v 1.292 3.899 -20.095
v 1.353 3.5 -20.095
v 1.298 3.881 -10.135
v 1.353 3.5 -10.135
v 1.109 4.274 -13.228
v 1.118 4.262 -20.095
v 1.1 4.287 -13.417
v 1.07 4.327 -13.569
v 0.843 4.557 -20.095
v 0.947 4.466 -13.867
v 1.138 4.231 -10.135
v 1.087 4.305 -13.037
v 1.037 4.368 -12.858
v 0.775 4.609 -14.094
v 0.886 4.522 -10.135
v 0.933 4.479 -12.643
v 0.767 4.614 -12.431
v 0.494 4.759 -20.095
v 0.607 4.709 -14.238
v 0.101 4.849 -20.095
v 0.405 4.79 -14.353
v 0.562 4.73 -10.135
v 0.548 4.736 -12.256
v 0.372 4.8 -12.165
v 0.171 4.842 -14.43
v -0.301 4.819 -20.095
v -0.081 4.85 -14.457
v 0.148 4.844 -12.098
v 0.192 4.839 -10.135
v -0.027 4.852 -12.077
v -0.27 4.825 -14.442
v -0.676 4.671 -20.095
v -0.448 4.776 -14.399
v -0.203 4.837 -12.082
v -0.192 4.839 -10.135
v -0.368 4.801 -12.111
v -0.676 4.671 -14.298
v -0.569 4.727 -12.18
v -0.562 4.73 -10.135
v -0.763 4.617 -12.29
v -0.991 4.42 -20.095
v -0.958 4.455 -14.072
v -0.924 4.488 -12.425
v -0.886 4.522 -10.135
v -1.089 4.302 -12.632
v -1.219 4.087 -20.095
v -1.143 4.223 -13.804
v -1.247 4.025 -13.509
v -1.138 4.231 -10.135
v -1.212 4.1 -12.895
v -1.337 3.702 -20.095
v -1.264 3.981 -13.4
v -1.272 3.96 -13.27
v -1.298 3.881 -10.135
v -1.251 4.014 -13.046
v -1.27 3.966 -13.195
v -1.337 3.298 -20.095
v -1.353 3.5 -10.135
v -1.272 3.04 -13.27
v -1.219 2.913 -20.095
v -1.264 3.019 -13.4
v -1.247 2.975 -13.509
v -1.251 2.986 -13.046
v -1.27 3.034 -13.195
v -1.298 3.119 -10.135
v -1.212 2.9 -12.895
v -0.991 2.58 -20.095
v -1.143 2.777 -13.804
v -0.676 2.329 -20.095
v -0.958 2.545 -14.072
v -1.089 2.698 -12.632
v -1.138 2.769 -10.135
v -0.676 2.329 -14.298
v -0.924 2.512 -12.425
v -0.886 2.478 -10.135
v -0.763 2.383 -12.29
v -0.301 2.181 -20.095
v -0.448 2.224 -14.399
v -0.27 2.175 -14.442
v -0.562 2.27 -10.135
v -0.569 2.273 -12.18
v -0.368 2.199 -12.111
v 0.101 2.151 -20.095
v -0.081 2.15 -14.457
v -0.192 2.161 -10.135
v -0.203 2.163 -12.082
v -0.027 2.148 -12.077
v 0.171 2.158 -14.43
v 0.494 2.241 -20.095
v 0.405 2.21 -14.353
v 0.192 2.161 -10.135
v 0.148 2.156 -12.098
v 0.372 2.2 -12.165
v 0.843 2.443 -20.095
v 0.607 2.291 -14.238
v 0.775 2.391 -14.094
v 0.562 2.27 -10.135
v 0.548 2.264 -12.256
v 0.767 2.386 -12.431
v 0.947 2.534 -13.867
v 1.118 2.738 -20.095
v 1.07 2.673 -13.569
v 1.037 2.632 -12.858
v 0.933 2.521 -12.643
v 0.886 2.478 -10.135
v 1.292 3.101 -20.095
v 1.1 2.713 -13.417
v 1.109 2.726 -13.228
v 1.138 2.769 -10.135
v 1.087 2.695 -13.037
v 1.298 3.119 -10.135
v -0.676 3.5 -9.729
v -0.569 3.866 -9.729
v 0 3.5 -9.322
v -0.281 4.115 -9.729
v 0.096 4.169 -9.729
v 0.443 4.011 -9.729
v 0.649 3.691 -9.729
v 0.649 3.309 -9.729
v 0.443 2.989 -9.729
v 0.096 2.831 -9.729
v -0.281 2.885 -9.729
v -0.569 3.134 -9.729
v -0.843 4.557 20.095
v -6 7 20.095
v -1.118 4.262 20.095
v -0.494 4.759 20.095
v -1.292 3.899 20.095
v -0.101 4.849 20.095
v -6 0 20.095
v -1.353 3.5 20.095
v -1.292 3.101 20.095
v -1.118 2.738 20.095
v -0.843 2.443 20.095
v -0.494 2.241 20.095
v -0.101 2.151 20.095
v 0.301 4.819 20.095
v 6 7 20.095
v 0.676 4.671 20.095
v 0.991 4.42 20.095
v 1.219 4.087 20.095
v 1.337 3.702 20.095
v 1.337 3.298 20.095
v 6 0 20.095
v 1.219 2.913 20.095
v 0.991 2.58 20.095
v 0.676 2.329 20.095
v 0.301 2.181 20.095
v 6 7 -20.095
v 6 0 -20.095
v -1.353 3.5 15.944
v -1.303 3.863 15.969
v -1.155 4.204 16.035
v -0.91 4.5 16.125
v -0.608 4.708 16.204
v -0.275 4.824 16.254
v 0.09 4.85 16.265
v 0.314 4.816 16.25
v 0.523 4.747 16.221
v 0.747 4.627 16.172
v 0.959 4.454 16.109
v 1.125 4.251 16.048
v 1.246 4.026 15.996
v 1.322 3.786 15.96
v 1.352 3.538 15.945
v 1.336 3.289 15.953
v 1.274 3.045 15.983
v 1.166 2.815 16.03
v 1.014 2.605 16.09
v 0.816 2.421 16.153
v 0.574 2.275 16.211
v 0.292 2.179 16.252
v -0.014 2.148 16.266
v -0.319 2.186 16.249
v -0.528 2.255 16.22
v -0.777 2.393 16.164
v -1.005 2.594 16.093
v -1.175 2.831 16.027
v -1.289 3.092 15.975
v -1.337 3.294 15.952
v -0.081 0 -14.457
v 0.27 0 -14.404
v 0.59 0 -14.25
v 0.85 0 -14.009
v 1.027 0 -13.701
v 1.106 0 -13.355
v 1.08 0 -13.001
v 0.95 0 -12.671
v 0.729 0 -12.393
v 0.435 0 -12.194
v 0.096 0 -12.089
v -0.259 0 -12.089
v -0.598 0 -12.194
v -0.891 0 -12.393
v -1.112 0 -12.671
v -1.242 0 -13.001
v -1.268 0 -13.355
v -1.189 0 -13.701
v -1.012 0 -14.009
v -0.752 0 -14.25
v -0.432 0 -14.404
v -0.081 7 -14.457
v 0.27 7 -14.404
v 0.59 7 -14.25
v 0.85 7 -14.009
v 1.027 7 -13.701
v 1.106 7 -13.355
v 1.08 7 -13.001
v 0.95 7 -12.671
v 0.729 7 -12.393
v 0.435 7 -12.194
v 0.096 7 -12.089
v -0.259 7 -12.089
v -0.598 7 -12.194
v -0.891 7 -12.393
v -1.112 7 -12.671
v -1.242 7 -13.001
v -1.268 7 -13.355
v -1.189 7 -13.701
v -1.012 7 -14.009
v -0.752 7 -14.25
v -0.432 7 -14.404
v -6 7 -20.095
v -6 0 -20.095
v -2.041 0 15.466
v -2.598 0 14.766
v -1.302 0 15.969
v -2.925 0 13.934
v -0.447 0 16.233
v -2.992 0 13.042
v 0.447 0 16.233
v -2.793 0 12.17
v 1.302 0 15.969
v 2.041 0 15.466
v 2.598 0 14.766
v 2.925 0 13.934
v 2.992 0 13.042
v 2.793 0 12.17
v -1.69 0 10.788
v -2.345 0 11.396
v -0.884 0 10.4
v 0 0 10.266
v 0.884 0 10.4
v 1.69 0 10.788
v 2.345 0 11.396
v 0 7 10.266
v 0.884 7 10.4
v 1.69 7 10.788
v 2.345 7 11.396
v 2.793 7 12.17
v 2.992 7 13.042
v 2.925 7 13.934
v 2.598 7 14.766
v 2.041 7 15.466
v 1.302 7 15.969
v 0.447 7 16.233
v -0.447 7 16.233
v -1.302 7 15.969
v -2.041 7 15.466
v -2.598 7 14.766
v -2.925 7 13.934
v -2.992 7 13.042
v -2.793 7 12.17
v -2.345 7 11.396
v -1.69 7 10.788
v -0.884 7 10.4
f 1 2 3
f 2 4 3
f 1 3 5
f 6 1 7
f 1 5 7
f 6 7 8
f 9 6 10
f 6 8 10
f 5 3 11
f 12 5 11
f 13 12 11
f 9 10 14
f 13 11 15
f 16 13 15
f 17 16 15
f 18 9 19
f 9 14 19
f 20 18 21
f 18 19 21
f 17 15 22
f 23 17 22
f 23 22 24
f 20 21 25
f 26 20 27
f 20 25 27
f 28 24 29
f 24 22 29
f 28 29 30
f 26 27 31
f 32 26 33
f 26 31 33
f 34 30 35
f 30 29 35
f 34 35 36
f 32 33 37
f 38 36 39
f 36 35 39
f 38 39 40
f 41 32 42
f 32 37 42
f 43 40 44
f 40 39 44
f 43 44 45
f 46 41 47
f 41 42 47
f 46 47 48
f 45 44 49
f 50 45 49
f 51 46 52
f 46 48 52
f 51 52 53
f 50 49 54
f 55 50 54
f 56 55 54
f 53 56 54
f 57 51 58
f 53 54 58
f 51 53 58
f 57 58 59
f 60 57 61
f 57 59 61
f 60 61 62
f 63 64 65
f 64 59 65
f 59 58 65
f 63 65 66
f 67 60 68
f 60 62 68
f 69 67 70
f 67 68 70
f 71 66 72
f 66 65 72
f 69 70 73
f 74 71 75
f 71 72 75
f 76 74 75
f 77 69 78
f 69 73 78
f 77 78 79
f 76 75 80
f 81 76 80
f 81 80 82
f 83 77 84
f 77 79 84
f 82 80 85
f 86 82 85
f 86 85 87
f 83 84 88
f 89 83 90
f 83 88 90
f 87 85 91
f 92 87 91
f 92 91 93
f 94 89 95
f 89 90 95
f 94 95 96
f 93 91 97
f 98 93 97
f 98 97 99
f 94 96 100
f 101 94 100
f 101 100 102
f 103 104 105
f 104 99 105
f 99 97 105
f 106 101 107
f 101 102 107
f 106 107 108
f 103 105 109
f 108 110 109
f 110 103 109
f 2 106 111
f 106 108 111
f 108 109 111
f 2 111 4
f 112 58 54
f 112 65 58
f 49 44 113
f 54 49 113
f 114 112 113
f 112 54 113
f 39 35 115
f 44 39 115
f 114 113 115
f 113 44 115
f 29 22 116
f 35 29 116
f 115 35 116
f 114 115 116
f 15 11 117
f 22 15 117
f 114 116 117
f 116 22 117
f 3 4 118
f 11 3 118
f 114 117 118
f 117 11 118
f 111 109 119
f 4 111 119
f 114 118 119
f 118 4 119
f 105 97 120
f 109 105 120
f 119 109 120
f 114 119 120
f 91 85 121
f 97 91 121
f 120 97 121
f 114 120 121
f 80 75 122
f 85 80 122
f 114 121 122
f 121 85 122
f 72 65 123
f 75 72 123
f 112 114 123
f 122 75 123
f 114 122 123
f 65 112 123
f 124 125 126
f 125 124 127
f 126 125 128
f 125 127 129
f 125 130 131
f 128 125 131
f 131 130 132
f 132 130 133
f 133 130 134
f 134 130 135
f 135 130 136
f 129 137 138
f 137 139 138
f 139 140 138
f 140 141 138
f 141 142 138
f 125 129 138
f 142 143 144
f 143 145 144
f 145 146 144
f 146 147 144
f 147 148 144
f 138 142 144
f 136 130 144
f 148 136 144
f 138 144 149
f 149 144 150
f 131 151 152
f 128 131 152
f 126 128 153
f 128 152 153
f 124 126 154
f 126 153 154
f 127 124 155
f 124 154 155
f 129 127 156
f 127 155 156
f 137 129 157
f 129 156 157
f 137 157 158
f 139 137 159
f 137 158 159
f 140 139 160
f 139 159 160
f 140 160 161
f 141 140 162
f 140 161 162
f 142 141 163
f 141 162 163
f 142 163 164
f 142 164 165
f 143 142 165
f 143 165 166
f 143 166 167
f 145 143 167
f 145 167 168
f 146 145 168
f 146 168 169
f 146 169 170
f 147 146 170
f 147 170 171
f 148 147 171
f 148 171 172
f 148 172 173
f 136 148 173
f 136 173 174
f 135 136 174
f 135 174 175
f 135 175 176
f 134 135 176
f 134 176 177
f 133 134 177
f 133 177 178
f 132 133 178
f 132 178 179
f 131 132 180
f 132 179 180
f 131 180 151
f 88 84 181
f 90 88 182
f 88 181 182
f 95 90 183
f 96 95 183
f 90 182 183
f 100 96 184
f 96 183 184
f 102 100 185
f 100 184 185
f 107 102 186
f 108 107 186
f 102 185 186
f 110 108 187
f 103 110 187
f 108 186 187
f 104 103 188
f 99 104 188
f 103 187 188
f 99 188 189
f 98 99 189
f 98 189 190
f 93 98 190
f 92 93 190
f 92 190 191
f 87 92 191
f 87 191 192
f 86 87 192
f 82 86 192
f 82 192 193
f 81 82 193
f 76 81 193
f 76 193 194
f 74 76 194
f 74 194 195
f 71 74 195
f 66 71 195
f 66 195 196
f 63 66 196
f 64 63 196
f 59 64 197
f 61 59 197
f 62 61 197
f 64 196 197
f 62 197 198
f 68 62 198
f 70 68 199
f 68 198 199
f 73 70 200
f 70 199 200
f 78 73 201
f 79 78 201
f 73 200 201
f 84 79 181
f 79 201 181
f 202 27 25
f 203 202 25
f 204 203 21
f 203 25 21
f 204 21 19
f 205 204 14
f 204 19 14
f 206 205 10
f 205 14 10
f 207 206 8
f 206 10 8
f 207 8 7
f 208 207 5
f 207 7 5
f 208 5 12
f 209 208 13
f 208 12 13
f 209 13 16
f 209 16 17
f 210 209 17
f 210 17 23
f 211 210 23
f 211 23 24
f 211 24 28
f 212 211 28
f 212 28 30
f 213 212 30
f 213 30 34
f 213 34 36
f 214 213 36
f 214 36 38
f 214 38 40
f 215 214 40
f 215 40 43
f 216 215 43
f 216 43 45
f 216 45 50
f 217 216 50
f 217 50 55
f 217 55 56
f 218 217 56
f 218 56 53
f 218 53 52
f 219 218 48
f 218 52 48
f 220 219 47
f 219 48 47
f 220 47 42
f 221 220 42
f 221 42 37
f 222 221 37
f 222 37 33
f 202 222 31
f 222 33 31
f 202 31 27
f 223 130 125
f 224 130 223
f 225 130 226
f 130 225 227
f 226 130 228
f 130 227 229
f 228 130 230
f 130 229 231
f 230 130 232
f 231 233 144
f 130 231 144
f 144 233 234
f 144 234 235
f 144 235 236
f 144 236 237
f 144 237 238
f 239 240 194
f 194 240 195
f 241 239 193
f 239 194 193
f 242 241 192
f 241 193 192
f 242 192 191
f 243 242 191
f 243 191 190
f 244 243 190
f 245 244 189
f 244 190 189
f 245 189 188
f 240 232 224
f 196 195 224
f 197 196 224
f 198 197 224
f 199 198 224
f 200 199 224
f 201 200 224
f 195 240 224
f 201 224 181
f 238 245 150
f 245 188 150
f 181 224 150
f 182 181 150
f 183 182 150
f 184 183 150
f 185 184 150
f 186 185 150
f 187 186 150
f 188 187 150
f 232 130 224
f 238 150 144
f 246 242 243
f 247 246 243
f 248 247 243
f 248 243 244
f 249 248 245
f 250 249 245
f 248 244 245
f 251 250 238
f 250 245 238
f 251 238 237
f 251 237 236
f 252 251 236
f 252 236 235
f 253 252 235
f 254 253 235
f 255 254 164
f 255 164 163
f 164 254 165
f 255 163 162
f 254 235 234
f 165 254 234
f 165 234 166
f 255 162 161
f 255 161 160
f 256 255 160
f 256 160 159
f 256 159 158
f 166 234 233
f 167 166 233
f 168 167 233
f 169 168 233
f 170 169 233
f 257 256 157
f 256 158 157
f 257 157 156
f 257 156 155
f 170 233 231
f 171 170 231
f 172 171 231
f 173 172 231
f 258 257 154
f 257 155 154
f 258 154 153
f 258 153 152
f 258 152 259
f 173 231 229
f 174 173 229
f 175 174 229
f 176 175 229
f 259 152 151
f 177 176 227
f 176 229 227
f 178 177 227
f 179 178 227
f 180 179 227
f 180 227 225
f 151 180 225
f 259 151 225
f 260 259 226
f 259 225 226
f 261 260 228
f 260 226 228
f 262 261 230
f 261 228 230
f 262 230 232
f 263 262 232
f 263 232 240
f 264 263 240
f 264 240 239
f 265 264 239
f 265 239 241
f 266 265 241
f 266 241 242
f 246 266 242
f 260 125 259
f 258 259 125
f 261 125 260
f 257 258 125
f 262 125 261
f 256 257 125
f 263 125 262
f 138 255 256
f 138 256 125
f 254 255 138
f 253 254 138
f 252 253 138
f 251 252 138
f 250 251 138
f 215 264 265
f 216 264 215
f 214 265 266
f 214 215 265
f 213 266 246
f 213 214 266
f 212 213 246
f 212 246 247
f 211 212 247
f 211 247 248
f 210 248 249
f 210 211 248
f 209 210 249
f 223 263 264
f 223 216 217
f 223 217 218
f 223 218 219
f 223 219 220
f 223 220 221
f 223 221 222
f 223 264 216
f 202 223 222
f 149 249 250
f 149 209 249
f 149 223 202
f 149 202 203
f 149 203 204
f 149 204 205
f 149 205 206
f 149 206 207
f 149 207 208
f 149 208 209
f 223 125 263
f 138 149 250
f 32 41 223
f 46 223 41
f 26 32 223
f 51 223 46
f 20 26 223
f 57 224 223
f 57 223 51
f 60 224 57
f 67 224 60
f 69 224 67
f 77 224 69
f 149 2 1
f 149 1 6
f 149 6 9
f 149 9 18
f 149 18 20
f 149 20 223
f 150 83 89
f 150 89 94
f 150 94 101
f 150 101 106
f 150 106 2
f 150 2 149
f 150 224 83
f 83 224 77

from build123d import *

# Parameters (mm, degrees)
SKETCH9_W                           = 12
SKETCH9_H                           = 40.19
EXTRUDE3_DEPTH                      = 7
F_3_32_0_09375_DIAMETER_HOLE1_D     = 2.38125
F_3_32_0_09375_DIAMETER_HOLE1_DEPTH = 10
F_3_32_0_09375_DIAMETER_HOLE1_TIP   = 0.715399675
F_6_0_6_DIAMETER_HOLE1_D            = 6
F_6_0_6_DIAMETER_HOLE1_DEPTH        = 10
F_6_0_6_DIAMETER_HOLE1_TIP          = 1.802581857
F_6_32_TAPPED_HOLE2_D               = 2.7051
F_6_32_TAPPED_HOLE2_DEPTH           = 7.9624
F_6_32_TAPPED_HOLE2_TIP             = 0.81269403
F_6_32_TAPPED_HOLE1_D               = 2.7051
F_6_32_TAPPED_HOLE1_DEPTH           = 9.96
F_6_32_TAPPED_HOLE1_TIP             = 0.81269403


with BuildPart() as part:
    # Sketch9 → Extrude3 (new body)
    with BuildSketch(Plane(origin=(0, 0, 0), x_dir=(1, 0, 0), z_dir=(0, 1, 0))):
        Rectangle(SKETCH9_W, SKETCH9_H)
    extrude(amount=EXTRUDE3_DEPTH)

    # 3/32 (0.09375) Diameter Hole1
    with Locations(Plane(origin=(-0.08113915, 7, -13.266251032), x_dir=(0, 0, 1), z_dir=(0, 1, 0))):
        with Locations((0, 0)):
            Hole(F_3_32_0_09375_DIAMETER_HOLE1_D / 2, depth=F_3_32_0_09375_DIAMETER_HOLE1_DEPTH)
            with Locations((0, 0, -(F_3_32_0_09375_DIAMETER_HOLE1_DEPTH + F_3_32_0_09375_DIAMETER_HOLE1_TIP / 2))):  # 118° drill point
                Cone(0, F_3_32_0_09375_DIAMETER_HOLE1_D / 2, F_3_32_0_09375_DIAMETER_HOLE1_TIP, mode=Mode.SUBTRACT)

    # Ø6.0 (6) Diameter Hole1
    with Locations(Plane(origin=(0, 7, 13.266499161), x_dir=(0, 0, 1), z_dir=(0, 1, 0))):
        with Locations((0, 0)):
            Hole(F_6_0_6_DIAMETER_HOLE1_D / 2, depth=F_6_0_6_DIAMETER_HOLE1_DEPTH)
            with Locations((0, 0, -(F_6_0_6_DIAMETER_HOLE1_DEPTH + F_6_0_6_DIAMETER_HOLE1_TIP / 2))):  # 118° drill point
                Cone(0, F_6_0_6_DIAMETER_HOLE1_D / 2, F_6_0_6_DIAMETER_HOLE1_TIP, mode=Mode.SUBTRACT)

    # #6-32 Tapped Hole2
    with Locations(Plane(origin=(0, 3.5, 20.095), x_dir=(1, 0, 0), z_dir=(0, 0, 1))):
        with Locations((0, 0)):
            Hole(F_6_32_TAPPED_HOLE2_D / 2, depth=F_6_32_TAPPED_HOLE2_DEPTH)
            with Locations((0, 0, -(F_6_32_TAPPED_HOLE2_DEPTH + F_6_32_TAPPED_HOLE2_TIP / 2))):  # 118° drill point
                Cone(0, F_6_32_TAPPED_HOLE2_D / 2, F_6_32_TAPPED_HOLE2_TIP, mode=Mode.SUBTRACT)

    # #6-32 Tapped Hole1
    with Locations(Plane(origin=(0, 3.5, -20.095), x_dir=(-1, 0, 0), z_dir=(0, 0, -1))):
        with Locations((0, 0)):
            Hole(F_6_32_TAPPED_HOLE1_D / 2, depth=F_6_32_TAPPED_HOLE1_DEPTH)
            with Locations((0, 0, -(F_6_32_TAPPED_HOLE1_DEPTH + F_6_32_TAPPED_HOLE1_TIP / 2))):  # 118° drill point
                Cone(0, F_6_32_TAPPED_HOLE1_D / 2, F_6_32_TAPPED_HOLE1_TIP, mode=Mode.SUBTRACT)


solid = part.part
